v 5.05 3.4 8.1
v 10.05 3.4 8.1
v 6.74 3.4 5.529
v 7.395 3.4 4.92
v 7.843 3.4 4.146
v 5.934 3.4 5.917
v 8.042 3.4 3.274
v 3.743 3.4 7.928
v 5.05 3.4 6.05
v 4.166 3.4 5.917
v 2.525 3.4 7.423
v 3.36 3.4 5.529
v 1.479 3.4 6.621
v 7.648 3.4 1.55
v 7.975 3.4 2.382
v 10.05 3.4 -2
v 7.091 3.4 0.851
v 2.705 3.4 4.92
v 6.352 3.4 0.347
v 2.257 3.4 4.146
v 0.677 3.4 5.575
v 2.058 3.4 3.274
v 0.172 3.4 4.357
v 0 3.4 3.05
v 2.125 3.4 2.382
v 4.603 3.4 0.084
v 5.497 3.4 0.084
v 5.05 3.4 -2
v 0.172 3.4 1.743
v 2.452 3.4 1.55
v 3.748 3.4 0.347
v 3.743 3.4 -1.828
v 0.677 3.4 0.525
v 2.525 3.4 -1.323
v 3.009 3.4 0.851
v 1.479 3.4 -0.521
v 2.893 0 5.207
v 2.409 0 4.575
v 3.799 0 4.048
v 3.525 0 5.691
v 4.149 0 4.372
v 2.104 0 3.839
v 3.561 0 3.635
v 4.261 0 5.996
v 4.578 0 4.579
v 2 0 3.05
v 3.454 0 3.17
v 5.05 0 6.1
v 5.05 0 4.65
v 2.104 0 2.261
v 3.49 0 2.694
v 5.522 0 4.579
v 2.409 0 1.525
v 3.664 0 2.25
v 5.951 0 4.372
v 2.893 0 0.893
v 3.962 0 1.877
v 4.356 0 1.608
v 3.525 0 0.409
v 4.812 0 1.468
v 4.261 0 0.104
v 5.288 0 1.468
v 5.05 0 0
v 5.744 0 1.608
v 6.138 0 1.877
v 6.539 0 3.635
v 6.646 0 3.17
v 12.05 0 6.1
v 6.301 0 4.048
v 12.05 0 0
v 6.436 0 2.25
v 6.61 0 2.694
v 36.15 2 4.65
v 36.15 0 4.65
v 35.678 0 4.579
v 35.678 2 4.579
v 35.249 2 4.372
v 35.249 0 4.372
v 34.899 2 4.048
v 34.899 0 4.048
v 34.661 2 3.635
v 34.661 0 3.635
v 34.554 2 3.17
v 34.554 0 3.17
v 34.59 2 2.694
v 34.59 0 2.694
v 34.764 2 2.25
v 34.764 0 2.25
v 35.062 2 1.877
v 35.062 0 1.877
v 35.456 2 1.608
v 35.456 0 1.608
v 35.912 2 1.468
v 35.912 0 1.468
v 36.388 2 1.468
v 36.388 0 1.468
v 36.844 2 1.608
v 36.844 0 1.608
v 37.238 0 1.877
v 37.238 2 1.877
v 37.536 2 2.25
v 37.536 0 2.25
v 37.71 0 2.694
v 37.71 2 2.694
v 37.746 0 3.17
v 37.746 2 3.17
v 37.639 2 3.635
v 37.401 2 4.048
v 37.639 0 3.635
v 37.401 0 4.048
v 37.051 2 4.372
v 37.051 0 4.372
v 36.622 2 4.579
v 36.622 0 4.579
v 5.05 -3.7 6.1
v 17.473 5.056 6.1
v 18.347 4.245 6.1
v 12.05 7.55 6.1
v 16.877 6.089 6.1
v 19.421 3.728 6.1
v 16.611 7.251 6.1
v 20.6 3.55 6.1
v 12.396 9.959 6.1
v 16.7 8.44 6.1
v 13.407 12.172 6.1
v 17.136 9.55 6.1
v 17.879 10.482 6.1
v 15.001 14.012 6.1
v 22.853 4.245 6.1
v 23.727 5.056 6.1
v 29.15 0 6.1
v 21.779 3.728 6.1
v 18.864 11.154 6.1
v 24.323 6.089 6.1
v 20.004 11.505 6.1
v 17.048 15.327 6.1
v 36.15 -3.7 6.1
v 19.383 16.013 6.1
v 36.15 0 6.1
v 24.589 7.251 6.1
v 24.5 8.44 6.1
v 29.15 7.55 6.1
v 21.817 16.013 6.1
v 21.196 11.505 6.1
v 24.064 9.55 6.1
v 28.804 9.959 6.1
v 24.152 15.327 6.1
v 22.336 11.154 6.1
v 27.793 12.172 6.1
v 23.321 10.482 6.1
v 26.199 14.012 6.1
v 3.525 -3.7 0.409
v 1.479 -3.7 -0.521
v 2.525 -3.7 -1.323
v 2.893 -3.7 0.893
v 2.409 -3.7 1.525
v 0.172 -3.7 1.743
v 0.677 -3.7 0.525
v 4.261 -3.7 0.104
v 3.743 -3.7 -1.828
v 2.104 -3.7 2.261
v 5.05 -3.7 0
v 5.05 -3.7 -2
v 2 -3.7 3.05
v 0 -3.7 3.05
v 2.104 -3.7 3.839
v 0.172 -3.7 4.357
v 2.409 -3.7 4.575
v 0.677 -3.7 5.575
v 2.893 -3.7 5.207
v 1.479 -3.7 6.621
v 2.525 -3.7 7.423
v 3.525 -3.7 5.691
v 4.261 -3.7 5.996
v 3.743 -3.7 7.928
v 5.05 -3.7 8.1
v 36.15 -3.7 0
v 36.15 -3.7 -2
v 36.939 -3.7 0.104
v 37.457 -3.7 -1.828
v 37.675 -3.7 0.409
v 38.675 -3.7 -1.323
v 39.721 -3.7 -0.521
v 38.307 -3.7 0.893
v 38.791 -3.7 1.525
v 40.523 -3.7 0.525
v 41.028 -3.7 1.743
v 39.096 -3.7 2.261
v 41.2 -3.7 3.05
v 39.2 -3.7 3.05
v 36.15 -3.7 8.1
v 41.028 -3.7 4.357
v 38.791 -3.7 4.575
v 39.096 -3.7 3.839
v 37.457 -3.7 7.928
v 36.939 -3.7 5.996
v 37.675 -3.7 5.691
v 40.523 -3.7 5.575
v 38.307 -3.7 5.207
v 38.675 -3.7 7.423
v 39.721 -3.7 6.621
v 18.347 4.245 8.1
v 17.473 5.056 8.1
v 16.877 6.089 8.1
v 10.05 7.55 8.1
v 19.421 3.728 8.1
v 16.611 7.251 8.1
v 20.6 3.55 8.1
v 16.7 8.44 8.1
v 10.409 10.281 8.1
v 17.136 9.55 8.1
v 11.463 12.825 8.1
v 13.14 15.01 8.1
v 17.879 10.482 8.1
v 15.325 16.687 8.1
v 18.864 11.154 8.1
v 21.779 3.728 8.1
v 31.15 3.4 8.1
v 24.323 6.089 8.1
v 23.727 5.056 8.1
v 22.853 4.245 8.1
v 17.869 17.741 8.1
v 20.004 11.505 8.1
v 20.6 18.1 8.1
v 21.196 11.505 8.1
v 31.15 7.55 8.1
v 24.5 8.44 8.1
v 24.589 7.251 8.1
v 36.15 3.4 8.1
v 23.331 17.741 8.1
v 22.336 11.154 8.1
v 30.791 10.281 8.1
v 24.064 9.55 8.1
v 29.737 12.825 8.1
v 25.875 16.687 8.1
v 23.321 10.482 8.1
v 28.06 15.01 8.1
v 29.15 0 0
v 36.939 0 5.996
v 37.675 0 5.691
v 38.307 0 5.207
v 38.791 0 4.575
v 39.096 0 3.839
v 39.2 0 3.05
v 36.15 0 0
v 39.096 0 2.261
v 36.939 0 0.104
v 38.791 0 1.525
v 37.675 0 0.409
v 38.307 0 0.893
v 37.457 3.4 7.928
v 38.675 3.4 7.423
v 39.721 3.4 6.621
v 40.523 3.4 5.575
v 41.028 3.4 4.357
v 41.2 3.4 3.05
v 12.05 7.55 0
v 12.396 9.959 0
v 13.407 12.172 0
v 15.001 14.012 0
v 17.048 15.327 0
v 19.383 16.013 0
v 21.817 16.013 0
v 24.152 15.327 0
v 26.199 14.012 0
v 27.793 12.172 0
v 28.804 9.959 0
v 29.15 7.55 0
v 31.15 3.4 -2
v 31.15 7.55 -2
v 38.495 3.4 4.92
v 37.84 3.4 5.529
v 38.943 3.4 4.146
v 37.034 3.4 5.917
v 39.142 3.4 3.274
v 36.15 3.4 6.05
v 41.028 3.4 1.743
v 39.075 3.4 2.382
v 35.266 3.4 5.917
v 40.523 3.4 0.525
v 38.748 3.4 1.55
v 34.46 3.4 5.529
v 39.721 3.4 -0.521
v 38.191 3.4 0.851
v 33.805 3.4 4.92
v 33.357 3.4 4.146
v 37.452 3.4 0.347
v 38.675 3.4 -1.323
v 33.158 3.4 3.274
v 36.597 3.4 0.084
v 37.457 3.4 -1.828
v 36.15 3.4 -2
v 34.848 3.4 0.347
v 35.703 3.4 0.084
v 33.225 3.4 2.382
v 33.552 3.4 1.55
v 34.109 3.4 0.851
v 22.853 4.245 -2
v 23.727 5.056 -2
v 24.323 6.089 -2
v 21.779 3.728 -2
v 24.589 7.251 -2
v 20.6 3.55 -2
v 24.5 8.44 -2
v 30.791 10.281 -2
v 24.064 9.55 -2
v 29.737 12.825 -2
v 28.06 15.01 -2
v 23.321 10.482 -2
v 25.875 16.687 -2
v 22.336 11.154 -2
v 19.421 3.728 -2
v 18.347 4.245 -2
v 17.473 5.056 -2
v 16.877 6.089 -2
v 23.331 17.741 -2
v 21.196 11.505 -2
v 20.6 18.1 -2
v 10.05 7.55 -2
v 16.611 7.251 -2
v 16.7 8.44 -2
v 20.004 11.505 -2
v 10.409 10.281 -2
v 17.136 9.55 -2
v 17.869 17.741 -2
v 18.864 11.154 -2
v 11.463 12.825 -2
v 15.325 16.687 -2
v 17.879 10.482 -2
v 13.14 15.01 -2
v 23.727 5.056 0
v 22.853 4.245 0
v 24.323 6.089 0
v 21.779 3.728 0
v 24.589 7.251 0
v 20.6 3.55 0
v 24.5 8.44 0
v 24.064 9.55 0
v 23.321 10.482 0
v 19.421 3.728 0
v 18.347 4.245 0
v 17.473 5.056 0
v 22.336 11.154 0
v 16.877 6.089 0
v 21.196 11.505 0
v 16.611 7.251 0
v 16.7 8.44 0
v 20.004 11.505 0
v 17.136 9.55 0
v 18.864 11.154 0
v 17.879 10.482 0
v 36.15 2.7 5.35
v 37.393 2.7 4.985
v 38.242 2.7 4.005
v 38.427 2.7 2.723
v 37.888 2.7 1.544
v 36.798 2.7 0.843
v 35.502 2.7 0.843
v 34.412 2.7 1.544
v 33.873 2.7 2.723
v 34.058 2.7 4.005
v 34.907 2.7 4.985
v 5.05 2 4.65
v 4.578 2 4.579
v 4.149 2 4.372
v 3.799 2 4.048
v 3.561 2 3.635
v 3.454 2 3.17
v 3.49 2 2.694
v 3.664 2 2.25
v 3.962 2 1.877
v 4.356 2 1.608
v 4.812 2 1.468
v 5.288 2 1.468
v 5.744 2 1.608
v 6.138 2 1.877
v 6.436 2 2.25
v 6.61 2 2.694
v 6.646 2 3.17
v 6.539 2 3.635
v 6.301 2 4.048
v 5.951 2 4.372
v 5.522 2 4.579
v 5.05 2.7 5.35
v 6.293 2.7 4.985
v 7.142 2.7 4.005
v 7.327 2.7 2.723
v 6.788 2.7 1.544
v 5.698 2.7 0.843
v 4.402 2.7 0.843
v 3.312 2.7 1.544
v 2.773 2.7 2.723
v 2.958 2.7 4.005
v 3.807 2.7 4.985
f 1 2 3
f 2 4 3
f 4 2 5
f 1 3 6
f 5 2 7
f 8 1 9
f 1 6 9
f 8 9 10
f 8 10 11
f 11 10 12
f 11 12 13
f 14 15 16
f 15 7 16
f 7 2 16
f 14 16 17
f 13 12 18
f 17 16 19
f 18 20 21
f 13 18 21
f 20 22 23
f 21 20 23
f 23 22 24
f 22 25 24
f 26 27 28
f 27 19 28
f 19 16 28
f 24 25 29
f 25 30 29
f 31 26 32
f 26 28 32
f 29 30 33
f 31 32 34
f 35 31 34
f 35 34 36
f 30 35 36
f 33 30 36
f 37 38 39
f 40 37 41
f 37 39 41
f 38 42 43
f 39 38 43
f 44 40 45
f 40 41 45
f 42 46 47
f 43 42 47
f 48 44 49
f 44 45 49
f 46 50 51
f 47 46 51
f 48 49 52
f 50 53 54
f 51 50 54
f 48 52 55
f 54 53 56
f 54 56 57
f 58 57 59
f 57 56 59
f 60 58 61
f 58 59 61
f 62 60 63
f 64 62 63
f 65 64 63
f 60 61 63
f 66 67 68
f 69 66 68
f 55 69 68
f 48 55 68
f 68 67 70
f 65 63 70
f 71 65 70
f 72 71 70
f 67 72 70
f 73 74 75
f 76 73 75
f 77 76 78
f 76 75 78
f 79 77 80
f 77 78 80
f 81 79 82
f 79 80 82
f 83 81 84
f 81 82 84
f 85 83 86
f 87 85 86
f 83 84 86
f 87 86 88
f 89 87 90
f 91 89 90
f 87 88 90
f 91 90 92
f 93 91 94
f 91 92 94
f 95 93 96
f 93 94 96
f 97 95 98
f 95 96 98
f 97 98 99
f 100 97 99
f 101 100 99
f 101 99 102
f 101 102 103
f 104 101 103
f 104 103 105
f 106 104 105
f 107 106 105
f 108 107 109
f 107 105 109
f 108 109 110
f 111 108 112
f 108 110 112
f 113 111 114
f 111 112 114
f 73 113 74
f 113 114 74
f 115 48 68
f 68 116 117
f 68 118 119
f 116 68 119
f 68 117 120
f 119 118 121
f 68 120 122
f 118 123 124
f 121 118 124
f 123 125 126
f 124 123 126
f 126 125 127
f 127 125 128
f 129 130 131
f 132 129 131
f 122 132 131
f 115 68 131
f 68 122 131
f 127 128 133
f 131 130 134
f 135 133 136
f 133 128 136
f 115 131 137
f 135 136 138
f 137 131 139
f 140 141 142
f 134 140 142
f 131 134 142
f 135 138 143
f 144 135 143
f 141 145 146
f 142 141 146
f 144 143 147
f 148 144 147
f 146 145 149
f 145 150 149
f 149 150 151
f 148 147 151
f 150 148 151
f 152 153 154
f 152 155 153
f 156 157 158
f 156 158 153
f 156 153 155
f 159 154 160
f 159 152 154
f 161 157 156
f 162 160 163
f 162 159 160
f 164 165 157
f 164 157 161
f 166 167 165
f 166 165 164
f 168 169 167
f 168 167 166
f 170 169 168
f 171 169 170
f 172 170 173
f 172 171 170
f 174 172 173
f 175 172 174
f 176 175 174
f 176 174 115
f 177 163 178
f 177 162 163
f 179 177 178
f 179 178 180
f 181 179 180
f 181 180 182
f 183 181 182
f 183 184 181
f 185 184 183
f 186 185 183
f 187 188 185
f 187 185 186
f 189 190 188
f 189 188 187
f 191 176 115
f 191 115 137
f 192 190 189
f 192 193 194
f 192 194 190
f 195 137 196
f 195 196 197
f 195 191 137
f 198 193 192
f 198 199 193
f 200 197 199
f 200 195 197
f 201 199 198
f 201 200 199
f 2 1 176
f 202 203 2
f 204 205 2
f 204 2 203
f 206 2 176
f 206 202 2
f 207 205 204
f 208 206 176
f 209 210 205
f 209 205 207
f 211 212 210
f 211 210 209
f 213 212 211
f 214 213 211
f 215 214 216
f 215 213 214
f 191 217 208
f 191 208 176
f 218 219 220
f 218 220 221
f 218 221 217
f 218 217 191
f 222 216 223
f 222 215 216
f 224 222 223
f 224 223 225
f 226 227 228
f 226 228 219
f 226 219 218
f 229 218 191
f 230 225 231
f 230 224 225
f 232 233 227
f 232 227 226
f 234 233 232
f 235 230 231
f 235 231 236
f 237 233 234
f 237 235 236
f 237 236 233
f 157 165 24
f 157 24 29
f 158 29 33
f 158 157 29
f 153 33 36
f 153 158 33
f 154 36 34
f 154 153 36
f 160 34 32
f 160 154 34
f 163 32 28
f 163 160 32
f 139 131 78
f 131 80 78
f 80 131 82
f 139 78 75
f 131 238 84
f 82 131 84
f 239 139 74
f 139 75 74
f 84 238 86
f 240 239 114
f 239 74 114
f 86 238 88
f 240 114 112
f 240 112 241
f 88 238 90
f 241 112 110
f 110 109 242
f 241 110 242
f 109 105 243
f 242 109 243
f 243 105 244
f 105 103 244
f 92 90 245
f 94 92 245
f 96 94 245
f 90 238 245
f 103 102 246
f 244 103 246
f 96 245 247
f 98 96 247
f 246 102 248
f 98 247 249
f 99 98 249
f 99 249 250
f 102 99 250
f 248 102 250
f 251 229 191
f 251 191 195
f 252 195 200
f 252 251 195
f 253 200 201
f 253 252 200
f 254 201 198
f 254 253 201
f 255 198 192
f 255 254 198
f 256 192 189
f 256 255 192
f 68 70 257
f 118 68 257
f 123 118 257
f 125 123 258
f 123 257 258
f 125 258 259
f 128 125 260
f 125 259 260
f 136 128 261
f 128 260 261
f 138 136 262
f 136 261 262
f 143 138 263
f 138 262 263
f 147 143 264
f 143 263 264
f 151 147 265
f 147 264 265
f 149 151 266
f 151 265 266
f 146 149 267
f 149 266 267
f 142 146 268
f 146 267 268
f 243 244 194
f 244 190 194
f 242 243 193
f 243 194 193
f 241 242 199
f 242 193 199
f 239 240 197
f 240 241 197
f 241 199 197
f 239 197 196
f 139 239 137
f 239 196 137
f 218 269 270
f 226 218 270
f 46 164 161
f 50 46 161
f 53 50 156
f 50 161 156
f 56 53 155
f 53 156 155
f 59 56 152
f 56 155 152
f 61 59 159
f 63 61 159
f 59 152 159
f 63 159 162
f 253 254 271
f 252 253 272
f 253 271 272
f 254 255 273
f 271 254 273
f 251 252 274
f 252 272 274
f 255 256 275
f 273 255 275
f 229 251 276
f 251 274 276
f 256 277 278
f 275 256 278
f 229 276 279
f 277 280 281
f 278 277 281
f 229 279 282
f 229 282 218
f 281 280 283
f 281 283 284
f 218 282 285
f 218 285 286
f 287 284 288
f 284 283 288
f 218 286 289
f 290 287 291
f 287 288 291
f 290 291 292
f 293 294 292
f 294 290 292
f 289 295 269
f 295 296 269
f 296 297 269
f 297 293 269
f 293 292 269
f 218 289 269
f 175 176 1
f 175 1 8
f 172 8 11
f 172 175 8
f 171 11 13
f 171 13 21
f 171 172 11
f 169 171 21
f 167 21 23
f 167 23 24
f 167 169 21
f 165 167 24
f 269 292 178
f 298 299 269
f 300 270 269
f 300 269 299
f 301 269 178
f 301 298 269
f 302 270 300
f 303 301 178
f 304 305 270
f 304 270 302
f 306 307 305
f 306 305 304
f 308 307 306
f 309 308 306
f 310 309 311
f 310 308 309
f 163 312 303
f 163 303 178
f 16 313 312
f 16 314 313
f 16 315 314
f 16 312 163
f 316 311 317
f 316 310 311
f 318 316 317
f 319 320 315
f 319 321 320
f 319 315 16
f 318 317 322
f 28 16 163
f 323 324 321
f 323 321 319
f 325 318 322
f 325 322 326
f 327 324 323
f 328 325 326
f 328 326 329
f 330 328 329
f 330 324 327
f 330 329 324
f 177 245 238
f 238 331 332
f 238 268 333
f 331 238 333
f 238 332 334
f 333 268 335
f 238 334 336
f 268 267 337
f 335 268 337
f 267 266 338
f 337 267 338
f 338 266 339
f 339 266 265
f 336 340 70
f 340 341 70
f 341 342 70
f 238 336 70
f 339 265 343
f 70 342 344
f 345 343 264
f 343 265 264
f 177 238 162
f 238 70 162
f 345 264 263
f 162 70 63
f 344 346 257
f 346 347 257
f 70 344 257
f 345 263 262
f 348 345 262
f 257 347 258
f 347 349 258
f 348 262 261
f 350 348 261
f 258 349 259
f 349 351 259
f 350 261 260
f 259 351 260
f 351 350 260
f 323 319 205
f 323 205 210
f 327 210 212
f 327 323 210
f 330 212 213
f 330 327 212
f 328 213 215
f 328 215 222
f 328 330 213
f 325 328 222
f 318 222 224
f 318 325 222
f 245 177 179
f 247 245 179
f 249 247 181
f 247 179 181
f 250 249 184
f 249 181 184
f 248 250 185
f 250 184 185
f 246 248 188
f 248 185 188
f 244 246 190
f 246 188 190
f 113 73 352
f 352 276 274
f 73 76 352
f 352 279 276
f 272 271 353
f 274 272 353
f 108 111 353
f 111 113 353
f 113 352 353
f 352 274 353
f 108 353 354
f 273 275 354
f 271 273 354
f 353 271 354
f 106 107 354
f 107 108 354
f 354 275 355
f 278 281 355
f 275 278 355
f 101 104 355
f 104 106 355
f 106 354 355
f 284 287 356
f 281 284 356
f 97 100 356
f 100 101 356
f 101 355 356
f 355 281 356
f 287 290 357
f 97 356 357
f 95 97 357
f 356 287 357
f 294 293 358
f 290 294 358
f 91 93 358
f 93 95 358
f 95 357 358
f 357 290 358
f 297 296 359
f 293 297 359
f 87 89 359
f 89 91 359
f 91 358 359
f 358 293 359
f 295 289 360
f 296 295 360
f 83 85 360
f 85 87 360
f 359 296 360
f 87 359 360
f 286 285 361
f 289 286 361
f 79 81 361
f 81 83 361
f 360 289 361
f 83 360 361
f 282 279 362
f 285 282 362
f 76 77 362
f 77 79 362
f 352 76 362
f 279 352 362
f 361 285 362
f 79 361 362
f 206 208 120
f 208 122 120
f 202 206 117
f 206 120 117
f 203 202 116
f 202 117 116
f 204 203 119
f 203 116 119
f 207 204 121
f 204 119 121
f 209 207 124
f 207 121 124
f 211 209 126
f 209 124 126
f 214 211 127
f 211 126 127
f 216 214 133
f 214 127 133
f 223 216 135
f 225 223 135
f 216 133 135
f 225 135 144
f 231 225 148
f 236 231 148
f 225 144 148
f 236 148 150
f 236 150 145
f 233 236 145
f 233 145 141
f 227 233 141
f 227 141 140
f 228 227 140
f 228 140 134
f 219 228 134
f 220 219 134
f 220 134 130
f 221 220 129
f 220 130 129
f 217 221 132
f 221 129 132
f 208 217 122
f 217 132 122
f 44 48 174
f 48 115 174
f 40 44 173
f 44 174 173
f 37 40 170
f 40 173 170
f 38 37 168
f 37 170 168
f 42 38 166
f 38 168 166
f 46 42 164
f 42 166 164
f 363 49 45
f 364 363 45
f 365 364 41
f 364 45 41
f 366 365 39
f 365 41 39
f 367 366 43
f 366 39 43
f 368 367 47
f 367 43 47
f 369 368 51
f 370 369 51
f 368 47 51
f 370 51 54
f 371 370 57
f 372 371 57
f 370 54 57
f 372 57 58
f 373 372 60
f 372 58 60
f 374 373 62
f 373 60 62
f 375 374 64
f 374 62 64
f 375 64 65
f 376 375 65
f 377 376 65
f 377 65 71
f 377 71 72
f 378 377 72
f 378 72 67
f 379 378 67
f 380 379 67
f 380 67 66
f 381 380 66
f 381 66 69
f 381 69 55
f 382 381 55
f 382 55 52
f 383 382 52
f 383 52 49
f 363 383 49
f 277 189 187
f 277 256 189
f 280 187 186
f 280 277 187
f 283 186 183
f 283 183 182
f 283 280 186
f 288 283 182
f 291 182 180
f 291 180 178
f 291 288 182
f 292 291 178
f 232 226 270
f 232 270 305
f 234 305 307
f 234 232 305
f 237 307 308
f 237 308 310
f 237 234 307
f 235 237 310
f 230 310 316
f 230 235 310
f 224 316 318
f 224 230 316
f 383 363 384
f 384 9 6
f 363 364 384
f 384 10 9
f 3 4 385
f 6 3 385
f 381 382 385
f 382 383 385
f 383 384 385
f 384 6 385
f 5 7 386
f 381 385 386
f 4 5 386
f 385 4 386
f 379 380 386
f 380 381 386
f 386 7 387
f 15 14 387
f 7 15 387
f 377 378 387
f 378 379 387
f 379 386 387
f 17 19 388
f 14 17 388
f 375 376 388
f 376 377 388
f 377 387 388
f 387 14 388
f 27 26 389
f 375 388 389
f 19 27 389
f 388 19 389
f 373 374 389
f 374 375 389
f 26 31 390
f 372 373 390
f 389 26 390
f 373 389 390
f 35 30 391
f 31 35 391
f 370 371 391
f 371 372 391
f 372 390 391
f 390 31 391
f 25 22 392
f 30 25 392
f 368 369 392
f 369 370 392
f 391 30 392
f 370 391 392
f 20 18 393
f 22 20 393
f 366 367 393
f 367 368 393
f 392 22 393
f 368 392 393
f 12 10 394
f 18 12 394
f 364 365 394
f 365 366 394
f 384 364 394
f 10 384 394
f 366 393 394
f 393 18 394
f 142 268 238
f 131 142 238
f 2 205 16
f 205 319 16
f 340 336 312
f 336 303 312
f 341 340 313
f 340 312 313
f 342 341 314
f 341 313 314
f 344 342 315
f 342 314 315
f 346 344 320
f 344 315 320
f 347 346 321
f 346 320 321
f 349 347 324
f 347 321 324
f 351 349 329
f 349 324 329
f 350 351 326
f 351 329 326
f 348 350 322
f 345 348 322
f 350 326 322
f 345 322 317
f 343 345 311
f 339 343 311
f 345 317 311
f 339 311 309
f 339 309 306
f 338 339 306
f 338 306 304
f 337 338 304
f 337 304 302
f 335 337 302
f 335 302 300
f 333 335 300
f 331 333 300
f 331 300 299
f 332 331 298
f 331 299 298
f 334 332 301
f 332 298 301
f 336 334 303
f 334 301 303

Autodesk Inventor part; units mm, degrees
ref_plane "YZ Plane" through (0, 0, 0) normal (1, 0, 0) x (0, 1, 0)
ref_plane "XZ Plane" through (0, 0, 0) normal (0, 1, 0) x (-1, 0, 0)
sketch "Эскиз2" plane through (0, 0, 0) normal (0, 0, 1) x (1, 0, 0)
  line L0 (0, 0) -> (10.05, 0)
  line L1 (10.05, 0) -> (10.05, 3.4)
  line L2 (10.05, 3.4) -> (0, 3.4)
  line L3 (0, 3.4) -> (0, 0)
  line L4 (10.05, 0) -> (31.15, 0)
  line L5 (31.15, 0) -> (31.15, 18.1)
  line L6 (31.15, 18.1) -> (10.05, 18.1)
  line L7 (10.05, 18.1) -> (10.05, 0)
  line L8 (31.15, 0) -> (41.2, 0)
  line L9 (41.2, 0) -> (41.2, 3.4)
  line L10 (41.2, 3.4) -> (31.15, 3.4)
  line L11 (31.15, 3.4) -> (31.15, 0)
  line L12 (20.6, 18.1) -> (20.6, 7.55)
  circle A0 centre (20.6, 7.55) radius 8.55
  line L13 (7, 0) -> (26, 0)
  line L14 (12.05, 7.55) -> (29.15, 7.55)
  line L15 (29.15, 7.55) -> (29.15, 0)
  line L16 (29.15, 0) -> (12.05, 0)
  line L17 (12.05, 0) -> (12.05, 7.55)
  point P0 (31.15, 3.4)
  point P1 (16.5875, 0)
  point P2 (24.6125, 0)
  point P3 (12.05, 0)
  point P4 (12.05, 7.55)
  point P5 (29.15, 0)
  dimension "d14" = 17.1
  dimension "d0" = 10.05
  dimension "d1" = 21.1
  dimension "d2" = 18.1
  dimension "d3" = 3.4
  dimension "d4" = 10.05
  dimension "d13" = 10.55
  dimension "d15" = 3.4
extrude "Выдавливание1" add sketch "Эскиз2" along normal blind 6.1 contours L3 L2 L1 L0 | L1 L7 L6 L12 A0 L17 L4 | L6 L5 L4 L15 A0 L12 | L10 L9 L8 L5
sketch "Эскиз4" plane through (0, 0, 6.1) normal (0, 0, 1) x (1, 0, 0)
  line L0 (0, 0) -> (12.05, 0) projected
  line L1 (12.05, 0) -> (12.05, 7.55) projected
  arc A0 (29.15, 7.55) -> (12.05, 7.55) centre (20.6, 7.55) ccw projected
  line L2 (29.15, 7.55) -> (29.15, 0) projected
  line L3 (41.2, 0) -> (41.2, 3.4) projected
  line L4 (41.2, 3.4) -> (31.15, 3.4) projected
  line L5 (31.15, 3.4) -> (31.15, 18.1) projected
  line L6 (31.15, 18.1) -> (10.05, 18.1) projected
  line L7 (10.05, 18.1) -> (10.05, 3.4) projected
  line L8 (10.05, 3.4) -> (0, 3.4) projected
  line L9 (0, 3.4) -> (0, 0) projected
  line L10 (12.05, 0) -> (29.15, 0)
  line L11 (29.15, 0) -> (41.2, 0) projected
extrude "Выдавливание3" add sketch "Эскиз4" along normal blind 2
ref_plane "РабПлоскость1" through (0, 0, 3.05) normal (0, 0, 1) x (1, 0, 0)
mirror "Зеркальное отражение2" about plane through (0, 0, 3.05) normal (0, 0, 1) of "Выдавливание3"
fillet "Сопряжение2" radius 10.55 2 edges at (31.15, 18.1, 3.05) (10.05, 18.1, 3.05)
sketch "Эскиз6" plane through (31.15, 3.4, 8.1) normal (0, 1, 0) x (1, 0, 0)
  line L0 (10.05, 10.1) -> (10.05, 0) projected
  line L1 (10.05, 5.05) -> (0, 5.05)
  line L2 (0, 10.1) -> (0, 0) projected
  line L3 (-21.1, 10.1) -> (-21.1, 0) projected
  line L4 (-21.1, 5.05) -> (-31.15, 5.05)
  line L5 (-31.15, 0) -> (-31.15, 10.1) projected
  line L6 (-26.125, 5.05) -> (-26.1, 5.05)
  line L7 (5.025, 5.05) -> (5, 5.05)
  point P0 (-31.15, 8.1)
  dimension "d35" = 0.025
  dimension "d36" = 0.025
hole "Отверстие2" at (5.05, 3.4, 3.05) at (36.15, 3.4, 3.05) direction (0, -1, 0) diameter 3.2 end through all countersink diameter 6 countersink angle 90
sketch "Эскиз7" plane through (0, 0, 8.1) normal (0, -1, 0) x (1, 0, 0)
  line L0 (0, -10.1) -> (0, 0) projected
  line L1 (41.2, -10.1) -> (31.15, -10.1) projected
  line L2 (0, 0) -> (41.2, 0)
  line L3 (41.2, 0) -> (41.2, -10.1)
  line L4 (41.2, -10.1) -> (0, -10.1)
  line L5 (0, -10.1) -> (0, 0)
  line L6 (0, 0) -> (2, 0)
  line L7 (2, 0) -> (2, -2)
  line L8 (2, -2) -> (39.2, -2)
  line L9 (39.2, -2) -> (39.2, -8.1)
  line L10 (39.2, -8.1) -> (2, -8.1)
  line L11 (2, -8.1) -> (2, -2)
  line L12 (41.2, -10.1) -> (41.2, 0) projected
  line L13 (41.2, -10.1) -> (39.2, -10.1)
  line L14 (39.2, -10.1) -> (39.2, -8.1)
  point P0 (0, -8.1)
  dimension "d37" = 2
  dimension "d38" = 2
  dimension "d39" = 2
  dimension "d40" = 2
extrude "Выдавливание4" add sketch "Эскиз7" along normal blind 3.7 contours L0 L2 L7 L11 L10 L14 L1 L4 | L2 L3 L1 L14 L9 L8 L7
sketch "Эскиз8" plane through (0, 0, 8.1) normal (0, 0, 1) x (1, 0, 0)
  arc A0 (31.15, 7.55) -> (10.05, 7.55) centre (20.6, 7.55) ccw projected
  point P0 (0, 0)
hole "Отверстие3" at (20.6, 7.55, 8.1) direction (0, 0, -1) diameter 8 end through all
fillet "Сопряжение3" radius 5.05 2 edges at (0, -0.15, 8.1) (0, -0.15, -2)
fillet "Сопряжение4" radius 5.05 2 edges at (41.2, -0.15, 8.1) (41.2, -0.15, -2)
fillet "Сопряжение5" radius 3.05 2 edges at (2, -1.85, 6.1) (2, -1.85, 0)
fillet "Сопряжение6" radius 3.05 2 edges at (39.2, -1.85, 0) (39.2, -1.85, 6.1)
equation "\"d0\" = d4"
equation "\"d15\" = d3"
equation "\"Радиус_гибки\" = Толщина"
equation "\"Ширина_просечки\" = Толщина"
equation "\"Глубина_просечки\" = 0.5 * Толщина"
equation "\"Размер_просечки\" = 4 * Толщина"
equation "\"Мин_остаток\" = 2 * Толщина"
equation "\"Радиус_перехода\" = Радиус_гибки"
equation "\"Радиус_Якоби\" = Толщина"
equation "\"Размер_зазора\" = Толщина"
equation "\"Толщина\" = 0.5"
properties part number "Крышка стойки подшипника"
